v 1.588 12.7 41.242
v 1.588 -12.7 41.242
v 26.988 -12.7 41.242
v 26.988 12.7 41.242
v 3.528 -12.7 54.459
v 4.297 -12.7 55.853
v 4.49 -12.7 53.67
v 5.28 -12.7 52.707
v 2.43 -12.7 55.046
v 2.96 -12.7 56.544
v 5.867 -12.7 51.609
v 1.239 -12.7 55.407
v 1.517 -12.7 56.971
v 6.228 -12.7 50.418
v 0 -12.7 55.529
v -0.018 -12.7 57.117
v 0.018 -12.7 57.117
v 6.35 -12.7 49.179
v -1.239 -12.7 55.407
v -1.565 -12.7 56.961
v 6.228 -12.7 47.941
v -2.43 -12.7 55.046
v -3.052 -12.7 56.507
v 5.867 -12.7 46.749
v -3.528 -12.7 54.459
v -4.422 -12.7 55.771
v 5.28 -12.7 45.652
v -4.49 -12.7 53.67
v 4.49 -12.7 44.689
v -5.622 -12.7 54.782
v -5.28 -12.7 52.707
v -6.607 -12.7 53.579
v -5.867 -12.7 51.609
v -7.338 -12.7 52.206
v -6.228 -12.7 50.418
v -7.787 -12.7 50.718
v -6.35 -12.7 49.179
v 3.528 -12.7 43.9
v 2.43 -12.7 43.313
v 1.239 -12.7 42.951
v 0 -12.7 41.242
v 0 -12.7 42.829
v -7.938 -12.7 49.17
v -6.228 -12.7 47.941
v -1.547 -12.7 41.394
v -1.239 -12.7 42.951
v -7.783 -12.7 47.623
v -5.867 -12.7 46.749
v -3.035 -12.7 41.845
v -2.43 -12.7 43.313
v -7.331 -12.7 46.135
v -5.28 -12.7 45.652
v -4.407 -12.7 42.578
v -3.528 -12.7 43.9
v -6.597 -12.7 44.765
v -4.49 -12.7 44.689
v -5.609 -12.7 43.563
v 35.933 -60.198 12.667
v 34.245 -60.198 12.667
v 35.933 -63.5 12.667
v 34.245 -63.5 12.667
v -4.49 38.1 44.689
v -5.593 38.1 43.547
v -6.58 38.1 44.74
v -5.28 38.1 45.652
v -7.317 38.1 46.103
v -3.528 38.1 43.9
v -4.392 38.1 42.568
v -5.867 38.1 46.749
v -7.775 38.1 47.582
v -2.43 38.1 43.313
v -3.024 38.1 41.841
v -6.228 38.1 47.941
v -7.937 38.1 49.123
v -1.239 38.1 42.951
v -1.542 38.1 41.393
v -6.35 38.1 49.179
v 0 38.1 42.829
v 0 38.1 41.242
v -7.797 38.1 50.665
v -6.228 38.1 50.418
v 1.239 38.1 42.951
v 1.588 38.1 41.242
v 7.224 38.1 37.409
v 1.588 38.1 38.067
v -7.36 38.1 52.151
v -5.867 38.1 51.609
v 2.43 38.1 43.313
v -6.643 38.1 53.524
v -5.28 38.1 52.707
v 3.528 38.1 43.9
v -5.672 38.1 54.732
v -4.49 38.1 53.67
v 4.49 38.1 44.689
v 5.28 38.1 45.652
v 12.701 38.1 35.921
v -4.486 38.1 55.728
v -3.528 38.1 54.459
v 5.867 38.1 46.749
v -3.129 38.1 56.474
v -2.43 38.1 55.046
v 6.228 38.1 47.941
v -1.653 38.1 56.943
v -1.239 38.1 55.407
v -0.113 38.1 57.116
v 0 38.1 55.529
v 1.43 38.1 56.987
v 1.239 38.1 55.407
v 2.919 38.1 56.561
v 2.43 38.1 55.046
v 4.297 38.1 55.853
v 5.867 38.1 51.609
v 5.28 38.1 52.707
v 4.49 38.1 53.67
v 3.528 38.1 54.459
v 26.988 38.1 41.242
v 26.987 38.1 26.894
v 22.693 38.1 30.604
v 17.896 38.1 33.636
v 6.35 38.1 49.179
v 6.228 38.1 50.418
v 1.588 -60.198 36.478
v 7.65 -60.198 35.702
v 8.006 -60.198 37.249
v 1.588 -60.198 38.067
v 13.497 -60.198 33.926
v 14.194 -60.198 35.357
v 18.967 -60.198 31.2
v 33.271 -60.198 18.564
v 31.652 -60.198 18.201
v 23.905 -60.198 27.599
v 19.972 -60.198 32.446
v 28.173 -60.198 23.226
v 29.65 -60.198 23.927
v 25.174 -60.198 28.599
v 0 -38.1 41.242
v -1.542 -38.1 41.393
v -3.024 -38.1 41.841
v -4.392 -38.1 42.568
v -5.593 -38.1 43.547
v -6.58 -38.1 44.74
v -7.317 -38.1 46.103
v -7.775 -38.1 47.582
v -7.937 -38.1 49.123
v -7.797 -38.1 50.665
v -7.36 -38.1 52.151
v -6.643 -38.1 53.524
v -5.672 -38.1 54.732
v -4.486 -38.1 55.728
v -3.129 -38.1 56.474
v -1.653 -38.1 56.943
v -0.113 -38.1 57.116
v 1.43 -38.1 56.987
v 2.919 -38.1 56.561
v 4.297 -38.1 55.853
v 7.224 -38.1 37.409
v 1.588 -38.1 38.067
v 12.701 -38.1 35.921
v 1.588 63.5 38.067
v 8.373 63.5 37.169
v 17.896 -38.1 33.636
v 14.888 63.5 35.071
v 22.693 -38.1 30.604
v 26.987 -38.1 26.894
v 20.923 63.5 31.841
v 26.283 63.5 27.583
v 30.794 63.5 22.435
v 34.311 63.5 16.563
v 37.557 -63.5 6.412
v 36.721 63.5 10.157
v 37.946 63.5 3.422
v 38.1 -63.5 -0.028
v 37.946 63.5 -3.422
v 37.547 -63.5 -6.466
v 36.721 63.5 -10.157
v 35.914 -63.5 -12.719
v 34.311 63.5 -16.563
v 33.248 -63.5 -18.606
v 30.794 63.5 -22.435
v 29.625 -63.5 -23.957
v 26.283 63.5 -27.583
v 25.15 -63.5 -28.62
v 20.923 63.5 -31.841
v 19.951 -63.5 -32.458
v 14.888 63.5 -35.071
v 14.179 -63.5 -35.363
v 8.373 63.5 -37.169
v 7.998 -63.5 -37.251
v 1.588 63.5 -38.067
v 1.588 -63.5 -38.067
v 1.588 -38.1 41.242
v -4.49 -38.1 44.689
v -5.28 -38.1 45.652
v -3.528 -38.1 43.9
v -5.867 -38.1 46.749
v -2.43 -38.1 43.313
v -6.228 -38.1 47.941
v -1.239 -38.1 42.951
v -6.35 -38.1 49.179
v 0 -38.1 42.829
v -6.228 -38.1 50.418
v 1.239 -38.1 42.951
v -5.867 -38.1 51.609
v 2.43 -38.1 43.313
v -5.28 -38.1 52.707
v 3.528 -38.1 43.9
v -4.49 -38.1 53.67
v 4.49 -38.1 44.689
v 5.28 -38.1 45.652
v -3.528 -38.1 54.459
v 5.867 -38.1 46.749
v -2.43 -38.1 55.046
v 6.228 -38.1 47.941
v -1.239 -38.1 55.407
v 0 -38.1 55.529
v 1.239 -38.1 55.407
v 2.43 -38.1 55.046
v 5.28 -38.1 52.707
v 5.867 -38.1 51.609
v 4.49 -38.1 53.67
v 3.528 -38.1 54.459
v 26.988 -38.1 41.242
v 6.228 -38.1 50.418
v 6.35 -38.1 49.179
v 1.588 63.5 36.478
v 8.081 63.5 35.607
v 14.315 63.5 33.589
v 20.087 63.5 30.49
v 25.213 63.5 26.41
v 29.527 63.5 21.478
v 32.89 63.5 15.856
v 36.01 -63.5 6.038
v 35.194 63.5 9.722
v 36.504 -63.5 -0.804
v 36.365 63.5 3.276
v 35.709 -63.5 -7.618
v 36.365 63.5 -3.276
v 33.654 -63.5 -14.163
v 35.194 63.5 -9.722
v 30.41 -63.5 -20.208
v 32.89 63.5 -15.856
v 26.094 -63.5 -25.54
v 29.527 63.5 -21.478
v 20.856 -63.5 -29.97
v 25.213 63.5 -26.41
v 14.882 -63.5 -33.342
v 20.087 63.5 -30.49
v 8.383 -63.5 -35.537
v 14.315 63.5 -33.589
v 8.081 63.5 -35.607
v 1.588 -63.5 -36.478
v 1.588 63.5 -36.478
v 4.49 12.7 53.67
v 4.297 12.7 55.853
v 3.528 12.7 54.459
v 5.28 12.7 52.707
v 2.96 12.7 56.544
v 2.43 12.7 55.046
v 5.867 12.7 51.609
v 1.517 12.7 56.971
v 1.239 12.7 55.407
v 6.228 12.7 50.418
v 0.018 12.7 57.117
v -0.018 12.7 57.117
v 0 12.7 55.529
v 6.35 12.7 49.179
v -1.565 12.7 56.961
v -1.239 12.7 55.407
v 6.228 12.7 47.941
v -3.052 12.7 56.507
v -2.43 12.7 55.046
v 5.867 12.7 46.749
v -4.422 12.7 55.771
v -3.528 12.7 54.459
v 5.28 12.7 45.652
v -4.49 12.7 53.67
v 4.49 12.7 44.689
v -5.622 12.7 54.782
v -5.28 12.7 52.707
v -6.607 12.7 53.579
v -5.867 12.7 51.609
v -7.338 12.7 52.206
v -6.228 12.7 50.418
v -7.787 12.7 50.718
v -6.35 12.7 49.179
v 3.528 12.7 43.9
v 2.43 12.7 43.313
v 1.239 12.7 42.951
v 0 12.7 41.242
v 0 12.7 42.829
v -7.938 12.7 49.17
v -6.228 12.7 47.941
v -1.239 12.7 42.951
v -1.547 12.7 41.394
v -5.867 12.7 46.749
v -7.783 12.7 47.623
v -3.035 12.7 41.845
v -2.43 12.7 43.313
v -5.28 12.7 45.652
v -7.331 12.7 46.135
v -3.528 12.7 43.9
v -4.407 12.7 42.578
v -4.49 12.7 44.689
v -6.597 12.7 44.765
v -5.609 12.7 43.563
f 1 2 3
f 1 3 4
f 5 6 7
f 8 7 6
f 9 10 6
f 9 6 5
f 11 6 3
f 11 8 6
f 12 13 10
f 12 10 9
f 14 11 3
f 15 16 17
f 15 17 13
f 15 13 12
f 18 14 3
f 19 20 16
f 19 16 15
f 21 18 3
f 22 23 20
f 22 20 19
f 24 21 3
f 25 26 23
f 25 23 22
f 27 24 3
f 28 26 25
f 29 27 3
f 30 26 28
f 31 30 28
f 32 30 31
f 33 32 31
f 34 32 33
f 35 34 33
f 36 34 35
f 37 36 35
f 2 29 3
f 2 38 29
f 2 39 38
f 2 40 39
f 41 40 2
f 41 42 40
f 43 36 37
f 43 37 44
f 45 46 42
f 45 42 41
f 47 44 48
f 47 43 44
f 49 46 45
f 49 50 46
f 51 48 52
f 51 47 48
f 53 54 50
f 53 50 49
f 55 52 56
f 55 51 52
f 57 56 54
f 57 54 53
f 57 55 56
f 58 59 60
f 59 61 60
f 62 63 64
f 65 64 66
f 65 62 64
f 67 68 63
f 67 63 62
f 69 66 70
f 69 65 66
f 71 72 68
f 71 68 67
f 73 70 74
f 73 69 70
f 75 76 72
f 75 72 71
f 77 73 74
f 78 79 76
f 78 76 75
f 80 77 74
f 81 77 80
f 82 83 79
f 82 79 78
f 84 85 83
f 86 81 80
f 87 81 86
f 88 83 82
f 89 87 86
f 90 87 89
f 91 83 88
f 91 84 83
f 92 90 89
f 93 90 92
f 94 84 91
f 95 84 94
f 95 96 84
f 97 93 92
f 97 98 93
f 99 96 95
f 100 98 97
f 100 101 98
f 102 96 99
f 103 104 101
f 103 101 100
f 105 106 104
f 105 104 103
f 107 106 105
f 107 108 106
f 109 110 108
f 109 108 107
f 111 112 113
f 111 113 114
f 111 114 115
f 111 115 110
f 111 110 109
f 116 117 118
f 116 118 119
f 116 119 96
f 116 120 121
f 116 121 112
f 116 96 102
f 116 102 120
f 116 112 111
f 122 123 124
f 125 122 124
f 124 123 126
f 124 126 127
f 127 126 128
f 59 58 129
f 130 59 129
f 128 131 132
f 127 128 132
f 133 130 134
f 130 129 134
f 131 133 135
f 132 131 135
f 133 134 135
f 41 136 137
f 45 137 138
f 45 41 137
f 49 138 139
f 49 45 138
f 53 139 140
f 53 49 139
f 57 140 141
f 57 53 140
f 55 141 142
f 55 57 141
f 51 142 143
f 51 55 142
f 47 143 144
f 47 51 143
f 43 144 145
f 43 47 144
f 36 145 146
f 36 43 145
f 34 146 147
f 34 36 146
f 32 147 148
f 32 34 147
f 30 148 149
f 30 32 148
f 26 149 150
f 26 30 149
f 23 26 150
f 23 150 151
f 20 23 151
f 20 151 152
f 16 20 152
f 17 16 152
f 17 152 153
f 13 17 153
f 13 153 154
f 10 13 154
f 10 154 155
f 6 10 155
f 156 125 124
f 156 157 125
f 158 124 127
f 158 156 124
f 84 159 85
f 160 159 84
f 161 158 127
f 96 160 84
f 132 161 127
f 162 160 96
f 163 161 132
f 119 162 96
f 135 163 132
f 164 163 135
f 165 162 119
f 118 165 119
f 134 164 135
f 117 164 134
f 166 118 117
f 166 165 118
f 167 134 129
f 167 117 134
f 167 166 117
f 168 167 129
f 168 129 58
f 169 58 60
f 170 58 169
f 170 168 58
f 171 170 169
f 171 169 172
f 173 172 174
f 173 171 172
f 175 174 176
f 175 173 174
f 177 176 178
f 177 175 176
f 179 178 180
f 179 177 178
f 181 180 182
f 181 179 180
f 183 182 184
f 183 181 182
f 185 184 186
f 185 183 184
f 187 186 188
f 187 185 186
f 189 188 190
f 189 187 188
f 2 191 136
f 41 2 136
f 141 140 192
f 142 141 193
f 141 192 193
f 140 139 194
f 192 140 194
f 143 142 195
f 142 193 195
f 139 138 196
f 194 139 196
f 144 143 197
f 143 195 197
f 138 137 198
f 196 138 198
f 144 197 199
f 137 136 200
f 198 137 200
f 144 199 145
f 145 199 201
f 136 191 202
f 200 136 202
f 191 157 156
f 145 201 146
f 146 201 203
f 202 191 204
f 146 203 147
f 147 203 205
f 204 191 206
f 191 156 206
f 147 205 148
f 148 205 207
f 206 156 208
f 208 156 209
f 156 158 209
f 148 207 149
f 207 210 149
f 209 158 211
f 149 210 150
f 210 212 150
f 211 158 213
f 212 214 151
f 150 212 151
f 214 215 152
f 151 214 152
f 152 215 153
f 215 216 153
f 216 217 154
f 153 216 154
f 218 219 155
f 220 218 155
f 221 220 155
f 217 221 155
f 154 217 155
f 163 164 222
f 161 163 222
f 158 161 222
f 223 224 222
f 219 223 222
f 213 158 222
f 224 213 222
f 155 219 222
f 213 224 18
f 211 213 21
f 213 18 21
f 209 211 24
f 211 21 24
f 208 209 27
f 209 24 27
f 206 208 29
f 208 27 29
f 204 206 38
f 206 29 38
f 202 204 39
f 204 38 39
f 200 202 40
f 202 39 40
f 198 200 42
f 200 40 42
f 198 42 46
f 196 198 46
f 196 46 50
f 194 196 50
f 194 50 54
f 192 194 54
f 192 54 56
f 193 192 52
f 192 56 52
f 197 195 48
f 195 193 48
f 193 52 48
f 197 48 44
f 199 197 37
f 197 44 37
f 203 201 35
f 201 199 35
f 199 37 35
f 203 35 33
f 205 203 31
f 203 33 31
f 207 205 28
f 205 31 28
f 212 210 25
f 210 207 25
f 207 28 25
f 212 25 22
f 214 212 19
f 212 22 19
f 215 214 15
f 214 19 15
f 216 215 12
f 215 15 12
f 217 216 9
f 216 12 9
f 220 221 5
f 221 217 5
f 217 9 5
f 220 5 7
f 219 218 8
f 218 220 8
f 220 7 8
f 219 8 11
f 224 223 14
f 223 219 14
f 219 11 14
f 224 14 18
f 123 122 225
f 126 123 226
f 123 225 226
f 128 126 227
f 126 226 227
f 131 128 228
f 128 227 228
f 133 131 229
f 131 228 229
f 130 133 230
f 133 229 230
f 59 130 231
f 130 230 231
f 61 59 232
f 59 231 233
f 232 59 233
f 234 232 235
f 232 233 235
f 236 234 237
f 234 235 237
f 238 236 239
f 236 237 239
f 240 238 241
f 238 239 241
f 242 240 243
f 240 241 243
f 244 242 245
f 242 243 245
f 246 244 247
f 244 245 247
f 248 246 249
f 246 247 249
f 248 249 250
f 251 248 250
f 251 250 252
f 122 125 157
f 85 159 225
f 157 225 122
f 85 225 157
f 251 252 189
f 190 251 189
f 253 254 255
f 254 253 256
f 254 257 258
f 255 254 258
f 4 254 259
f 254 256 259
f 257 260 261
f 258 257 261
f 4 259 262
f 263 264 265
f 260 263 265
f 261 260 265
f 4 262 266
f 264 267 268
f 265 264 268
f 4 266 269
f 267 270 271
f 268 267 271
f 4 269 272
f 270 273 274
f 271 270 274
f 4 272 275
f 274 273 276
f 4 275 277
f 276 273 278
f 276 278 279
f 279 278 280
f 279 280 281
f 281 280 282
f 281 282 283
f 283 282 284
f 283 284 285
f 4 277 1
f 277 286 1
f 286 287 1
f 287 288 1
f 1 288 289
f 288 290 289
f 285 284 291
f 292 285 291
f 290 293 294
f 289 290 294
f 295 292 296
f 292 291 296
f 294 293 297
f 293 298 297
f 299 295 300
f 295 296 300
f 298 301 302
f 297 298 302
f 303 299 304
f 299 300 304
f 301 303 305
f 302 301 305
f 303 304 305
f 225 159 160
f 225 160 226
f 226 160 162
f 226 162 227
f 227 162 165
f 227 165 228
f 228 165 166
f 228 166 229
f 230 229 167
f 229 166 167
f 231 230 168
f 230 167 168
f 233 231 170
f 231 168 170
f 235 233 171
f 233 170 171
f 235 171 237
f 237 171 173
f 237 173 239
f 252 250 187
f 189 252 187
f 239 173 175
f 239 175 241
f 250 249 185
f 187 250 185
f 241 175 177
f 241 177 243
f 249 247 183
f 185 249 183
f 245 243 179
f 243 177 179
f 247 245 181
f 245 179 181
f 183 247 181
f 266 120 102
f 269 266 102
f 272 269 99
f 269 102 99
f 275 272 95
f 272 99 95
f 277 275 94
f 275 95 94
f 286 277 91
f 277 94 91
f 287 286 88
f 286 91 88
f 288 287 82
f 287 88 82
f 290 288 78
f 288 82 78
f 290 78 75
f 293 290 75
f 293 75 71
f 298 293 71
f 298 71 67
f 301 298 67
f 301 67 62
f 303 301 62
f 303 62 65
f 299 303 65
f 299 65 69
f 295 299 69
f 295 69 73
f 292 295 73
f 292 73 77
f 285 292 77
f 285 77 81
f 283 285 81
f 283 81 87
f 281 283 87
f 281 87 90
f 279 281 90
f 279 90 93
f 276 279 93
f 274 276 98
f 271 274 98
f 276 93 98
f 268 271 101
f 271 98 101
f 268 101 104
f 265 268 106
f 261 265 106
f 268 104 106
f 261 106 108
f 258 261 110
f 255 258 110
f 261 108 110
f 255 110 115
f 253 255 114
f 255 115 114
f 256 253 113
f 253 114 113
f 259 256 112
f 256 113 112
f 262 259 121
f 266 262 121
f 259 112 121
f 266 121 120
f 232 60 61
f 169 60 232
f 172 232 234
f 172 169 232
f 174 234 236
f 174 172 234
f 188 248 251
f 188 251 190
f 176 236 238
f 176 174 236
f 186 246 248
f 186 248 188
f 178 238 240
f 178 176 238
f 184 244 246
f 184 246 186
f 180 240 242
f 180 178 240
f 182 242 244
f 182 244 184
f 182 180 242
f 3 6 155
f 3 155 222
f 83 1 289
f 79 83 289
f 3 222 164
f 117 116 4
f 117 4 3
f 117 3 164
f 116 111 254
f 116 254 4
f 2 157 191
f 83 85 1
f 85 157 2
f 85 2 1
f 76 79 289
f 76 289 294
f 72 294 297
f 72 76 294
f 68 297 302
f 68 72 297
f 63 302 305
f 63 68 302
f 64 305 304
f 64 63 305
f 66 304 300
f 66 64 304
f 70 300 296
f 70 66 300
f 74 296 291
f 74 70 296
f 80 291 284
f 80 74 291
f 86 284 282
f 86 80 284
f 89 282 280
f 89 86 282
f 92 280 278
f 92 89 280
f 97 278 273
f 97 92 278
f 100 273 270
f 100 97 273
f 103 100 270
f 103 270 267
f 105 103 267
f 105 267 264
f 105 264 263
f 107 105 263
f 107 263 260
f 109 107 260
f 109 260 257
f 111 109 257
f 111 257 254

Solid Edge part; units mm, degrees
sketch "Sketch1" plane through (0, 0, 0) normal (0, -1, 0) x (1, 0, 0)
  line L0 (1.5875, -36.478) -> (1.5875, -38.0669)
  arc A0 (1.5875, 38.0669) -> (1.5875, -38.0669) centre (0, 0) cw
  line L1 (1.5875, 38.0669) -> (1.5875, 36.478)
  arc A1 (1.5875, 36.478) -> (1.5875, -36.478) centre (0, 0) cw
  dimension "D1" = 76.2
extrude "Protrusion1" add sketch "Sketch1" along normal mid plane 127
sketch "Sketch2" plane through (0, 0, 0) normal (0, -1, 0) x (1, 0, 0)
  circle A0 centre (0, 49.1794) radius 6.35
  line L0 (1.5875, 38.0669) -> (1.5875, 41.2419)
  line L1 (1.5875, 41.2419) -> (0, 41.2419)
  line L2 (4.2974, 55.853) -> (26.9875, 41.2419)
  line L3 (26.9875, 41.2419) -> (26.9875, 26.894)
  arc A1 (26.9875, 26.894) -> (1.5875, 38.0669) centre (0, 0) ccw
  arc A2 (0, 41.2419) -> (4.2974, 55.853) centre (0, 49.1794) cw
  dimension "D1" = 3.175
  dimension "D2" = 12.7
  dimension "D3" = 1.5875
  dimension "D4" = 7.9375
extrude "ExtrudedProtrusion_2" add sketch "Sketch2" along normal mid plane 76.2
sketch "Sketch3" plane through (0, 0, 0) normal (1, 0, 0) x (0, 1, 0)
  line L0 (-12.7, 41.2419) -> (12.7, 41.2419)
  line L1 (12.7, 57.1169) -> (12.7, 41.2419)
  line L2 (-12.7, 57.1169) -> (12.7, 57.1169)
  line L3 (-12.7, 57.1169) -> (-12.7, 41.2419)
extrude "ExtrudedCutout_1" cut sketch "Sketch3" along normal mid plane 118.5822
sketch "Sketch4" plane through (19.8438, -63.5, 0) normal (0, -1, 0) x (0, 0, -1)
  line L0 (-38.0669, -18.2562) -> (-38.0669, 16.089)
  line L1 (-12.6669, 16.089) -> (-38.0669, 16.089)
  line L2 (-12.6669, -18.2562) -> (-12.6669, 16.089)
  line L3 (-38.0669, -18.2562) -> (-12.6669, -18.2562)
  dimension "D1" = 25.4
extrude "ExtrudedCutout_2" cut sketch "Sketch4" against normal blind 3.302
